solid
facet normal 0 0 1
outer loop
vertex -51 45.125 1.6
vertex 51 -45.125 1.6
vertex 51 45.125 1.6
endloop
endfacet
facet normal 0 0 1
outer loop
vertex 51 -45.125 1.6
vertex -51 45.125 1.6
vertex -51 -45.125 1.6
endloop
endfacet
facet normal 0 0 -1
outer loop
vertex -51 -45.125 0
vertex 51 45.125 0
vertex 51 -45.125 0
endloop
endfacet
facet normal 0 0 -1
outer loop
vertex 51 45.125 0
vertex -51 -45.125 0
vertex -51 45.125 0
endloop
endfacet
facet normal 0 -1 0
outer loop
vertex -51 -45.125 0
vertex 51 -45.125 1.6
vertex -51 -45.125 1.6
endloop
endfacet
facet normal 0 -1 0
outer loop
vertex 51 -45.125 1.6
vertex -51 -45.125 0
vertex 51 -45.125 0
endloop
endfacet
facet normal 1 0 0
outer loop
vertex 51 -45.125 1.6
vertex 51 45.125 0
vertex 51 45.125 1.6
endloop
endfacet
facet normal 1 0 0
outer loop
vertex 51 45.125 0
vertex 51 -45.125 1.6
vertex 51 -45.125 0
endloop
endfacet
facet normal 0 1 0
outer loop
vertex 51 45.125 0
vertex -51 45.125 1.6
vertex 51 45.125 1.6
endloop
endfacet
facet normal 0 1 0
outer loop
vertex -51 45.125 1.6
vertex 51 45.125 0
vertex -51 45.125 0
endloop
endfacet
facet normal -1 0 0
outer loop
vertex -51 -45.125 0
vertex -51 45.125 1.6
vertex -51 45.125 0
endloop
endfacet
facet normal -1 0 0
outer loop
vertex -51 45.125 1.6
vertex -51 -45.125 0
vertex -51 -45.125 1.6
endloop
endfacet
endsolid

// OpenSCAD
$fn = 64;

board_x = 102.0;
board_y = 90.25;
board_th = 1.6;

color([0.05, 0.45, 0.12])
translate([-board_x/2, -board_y/2, 0])
cube([board_x, board_y, board_th], center=false);
